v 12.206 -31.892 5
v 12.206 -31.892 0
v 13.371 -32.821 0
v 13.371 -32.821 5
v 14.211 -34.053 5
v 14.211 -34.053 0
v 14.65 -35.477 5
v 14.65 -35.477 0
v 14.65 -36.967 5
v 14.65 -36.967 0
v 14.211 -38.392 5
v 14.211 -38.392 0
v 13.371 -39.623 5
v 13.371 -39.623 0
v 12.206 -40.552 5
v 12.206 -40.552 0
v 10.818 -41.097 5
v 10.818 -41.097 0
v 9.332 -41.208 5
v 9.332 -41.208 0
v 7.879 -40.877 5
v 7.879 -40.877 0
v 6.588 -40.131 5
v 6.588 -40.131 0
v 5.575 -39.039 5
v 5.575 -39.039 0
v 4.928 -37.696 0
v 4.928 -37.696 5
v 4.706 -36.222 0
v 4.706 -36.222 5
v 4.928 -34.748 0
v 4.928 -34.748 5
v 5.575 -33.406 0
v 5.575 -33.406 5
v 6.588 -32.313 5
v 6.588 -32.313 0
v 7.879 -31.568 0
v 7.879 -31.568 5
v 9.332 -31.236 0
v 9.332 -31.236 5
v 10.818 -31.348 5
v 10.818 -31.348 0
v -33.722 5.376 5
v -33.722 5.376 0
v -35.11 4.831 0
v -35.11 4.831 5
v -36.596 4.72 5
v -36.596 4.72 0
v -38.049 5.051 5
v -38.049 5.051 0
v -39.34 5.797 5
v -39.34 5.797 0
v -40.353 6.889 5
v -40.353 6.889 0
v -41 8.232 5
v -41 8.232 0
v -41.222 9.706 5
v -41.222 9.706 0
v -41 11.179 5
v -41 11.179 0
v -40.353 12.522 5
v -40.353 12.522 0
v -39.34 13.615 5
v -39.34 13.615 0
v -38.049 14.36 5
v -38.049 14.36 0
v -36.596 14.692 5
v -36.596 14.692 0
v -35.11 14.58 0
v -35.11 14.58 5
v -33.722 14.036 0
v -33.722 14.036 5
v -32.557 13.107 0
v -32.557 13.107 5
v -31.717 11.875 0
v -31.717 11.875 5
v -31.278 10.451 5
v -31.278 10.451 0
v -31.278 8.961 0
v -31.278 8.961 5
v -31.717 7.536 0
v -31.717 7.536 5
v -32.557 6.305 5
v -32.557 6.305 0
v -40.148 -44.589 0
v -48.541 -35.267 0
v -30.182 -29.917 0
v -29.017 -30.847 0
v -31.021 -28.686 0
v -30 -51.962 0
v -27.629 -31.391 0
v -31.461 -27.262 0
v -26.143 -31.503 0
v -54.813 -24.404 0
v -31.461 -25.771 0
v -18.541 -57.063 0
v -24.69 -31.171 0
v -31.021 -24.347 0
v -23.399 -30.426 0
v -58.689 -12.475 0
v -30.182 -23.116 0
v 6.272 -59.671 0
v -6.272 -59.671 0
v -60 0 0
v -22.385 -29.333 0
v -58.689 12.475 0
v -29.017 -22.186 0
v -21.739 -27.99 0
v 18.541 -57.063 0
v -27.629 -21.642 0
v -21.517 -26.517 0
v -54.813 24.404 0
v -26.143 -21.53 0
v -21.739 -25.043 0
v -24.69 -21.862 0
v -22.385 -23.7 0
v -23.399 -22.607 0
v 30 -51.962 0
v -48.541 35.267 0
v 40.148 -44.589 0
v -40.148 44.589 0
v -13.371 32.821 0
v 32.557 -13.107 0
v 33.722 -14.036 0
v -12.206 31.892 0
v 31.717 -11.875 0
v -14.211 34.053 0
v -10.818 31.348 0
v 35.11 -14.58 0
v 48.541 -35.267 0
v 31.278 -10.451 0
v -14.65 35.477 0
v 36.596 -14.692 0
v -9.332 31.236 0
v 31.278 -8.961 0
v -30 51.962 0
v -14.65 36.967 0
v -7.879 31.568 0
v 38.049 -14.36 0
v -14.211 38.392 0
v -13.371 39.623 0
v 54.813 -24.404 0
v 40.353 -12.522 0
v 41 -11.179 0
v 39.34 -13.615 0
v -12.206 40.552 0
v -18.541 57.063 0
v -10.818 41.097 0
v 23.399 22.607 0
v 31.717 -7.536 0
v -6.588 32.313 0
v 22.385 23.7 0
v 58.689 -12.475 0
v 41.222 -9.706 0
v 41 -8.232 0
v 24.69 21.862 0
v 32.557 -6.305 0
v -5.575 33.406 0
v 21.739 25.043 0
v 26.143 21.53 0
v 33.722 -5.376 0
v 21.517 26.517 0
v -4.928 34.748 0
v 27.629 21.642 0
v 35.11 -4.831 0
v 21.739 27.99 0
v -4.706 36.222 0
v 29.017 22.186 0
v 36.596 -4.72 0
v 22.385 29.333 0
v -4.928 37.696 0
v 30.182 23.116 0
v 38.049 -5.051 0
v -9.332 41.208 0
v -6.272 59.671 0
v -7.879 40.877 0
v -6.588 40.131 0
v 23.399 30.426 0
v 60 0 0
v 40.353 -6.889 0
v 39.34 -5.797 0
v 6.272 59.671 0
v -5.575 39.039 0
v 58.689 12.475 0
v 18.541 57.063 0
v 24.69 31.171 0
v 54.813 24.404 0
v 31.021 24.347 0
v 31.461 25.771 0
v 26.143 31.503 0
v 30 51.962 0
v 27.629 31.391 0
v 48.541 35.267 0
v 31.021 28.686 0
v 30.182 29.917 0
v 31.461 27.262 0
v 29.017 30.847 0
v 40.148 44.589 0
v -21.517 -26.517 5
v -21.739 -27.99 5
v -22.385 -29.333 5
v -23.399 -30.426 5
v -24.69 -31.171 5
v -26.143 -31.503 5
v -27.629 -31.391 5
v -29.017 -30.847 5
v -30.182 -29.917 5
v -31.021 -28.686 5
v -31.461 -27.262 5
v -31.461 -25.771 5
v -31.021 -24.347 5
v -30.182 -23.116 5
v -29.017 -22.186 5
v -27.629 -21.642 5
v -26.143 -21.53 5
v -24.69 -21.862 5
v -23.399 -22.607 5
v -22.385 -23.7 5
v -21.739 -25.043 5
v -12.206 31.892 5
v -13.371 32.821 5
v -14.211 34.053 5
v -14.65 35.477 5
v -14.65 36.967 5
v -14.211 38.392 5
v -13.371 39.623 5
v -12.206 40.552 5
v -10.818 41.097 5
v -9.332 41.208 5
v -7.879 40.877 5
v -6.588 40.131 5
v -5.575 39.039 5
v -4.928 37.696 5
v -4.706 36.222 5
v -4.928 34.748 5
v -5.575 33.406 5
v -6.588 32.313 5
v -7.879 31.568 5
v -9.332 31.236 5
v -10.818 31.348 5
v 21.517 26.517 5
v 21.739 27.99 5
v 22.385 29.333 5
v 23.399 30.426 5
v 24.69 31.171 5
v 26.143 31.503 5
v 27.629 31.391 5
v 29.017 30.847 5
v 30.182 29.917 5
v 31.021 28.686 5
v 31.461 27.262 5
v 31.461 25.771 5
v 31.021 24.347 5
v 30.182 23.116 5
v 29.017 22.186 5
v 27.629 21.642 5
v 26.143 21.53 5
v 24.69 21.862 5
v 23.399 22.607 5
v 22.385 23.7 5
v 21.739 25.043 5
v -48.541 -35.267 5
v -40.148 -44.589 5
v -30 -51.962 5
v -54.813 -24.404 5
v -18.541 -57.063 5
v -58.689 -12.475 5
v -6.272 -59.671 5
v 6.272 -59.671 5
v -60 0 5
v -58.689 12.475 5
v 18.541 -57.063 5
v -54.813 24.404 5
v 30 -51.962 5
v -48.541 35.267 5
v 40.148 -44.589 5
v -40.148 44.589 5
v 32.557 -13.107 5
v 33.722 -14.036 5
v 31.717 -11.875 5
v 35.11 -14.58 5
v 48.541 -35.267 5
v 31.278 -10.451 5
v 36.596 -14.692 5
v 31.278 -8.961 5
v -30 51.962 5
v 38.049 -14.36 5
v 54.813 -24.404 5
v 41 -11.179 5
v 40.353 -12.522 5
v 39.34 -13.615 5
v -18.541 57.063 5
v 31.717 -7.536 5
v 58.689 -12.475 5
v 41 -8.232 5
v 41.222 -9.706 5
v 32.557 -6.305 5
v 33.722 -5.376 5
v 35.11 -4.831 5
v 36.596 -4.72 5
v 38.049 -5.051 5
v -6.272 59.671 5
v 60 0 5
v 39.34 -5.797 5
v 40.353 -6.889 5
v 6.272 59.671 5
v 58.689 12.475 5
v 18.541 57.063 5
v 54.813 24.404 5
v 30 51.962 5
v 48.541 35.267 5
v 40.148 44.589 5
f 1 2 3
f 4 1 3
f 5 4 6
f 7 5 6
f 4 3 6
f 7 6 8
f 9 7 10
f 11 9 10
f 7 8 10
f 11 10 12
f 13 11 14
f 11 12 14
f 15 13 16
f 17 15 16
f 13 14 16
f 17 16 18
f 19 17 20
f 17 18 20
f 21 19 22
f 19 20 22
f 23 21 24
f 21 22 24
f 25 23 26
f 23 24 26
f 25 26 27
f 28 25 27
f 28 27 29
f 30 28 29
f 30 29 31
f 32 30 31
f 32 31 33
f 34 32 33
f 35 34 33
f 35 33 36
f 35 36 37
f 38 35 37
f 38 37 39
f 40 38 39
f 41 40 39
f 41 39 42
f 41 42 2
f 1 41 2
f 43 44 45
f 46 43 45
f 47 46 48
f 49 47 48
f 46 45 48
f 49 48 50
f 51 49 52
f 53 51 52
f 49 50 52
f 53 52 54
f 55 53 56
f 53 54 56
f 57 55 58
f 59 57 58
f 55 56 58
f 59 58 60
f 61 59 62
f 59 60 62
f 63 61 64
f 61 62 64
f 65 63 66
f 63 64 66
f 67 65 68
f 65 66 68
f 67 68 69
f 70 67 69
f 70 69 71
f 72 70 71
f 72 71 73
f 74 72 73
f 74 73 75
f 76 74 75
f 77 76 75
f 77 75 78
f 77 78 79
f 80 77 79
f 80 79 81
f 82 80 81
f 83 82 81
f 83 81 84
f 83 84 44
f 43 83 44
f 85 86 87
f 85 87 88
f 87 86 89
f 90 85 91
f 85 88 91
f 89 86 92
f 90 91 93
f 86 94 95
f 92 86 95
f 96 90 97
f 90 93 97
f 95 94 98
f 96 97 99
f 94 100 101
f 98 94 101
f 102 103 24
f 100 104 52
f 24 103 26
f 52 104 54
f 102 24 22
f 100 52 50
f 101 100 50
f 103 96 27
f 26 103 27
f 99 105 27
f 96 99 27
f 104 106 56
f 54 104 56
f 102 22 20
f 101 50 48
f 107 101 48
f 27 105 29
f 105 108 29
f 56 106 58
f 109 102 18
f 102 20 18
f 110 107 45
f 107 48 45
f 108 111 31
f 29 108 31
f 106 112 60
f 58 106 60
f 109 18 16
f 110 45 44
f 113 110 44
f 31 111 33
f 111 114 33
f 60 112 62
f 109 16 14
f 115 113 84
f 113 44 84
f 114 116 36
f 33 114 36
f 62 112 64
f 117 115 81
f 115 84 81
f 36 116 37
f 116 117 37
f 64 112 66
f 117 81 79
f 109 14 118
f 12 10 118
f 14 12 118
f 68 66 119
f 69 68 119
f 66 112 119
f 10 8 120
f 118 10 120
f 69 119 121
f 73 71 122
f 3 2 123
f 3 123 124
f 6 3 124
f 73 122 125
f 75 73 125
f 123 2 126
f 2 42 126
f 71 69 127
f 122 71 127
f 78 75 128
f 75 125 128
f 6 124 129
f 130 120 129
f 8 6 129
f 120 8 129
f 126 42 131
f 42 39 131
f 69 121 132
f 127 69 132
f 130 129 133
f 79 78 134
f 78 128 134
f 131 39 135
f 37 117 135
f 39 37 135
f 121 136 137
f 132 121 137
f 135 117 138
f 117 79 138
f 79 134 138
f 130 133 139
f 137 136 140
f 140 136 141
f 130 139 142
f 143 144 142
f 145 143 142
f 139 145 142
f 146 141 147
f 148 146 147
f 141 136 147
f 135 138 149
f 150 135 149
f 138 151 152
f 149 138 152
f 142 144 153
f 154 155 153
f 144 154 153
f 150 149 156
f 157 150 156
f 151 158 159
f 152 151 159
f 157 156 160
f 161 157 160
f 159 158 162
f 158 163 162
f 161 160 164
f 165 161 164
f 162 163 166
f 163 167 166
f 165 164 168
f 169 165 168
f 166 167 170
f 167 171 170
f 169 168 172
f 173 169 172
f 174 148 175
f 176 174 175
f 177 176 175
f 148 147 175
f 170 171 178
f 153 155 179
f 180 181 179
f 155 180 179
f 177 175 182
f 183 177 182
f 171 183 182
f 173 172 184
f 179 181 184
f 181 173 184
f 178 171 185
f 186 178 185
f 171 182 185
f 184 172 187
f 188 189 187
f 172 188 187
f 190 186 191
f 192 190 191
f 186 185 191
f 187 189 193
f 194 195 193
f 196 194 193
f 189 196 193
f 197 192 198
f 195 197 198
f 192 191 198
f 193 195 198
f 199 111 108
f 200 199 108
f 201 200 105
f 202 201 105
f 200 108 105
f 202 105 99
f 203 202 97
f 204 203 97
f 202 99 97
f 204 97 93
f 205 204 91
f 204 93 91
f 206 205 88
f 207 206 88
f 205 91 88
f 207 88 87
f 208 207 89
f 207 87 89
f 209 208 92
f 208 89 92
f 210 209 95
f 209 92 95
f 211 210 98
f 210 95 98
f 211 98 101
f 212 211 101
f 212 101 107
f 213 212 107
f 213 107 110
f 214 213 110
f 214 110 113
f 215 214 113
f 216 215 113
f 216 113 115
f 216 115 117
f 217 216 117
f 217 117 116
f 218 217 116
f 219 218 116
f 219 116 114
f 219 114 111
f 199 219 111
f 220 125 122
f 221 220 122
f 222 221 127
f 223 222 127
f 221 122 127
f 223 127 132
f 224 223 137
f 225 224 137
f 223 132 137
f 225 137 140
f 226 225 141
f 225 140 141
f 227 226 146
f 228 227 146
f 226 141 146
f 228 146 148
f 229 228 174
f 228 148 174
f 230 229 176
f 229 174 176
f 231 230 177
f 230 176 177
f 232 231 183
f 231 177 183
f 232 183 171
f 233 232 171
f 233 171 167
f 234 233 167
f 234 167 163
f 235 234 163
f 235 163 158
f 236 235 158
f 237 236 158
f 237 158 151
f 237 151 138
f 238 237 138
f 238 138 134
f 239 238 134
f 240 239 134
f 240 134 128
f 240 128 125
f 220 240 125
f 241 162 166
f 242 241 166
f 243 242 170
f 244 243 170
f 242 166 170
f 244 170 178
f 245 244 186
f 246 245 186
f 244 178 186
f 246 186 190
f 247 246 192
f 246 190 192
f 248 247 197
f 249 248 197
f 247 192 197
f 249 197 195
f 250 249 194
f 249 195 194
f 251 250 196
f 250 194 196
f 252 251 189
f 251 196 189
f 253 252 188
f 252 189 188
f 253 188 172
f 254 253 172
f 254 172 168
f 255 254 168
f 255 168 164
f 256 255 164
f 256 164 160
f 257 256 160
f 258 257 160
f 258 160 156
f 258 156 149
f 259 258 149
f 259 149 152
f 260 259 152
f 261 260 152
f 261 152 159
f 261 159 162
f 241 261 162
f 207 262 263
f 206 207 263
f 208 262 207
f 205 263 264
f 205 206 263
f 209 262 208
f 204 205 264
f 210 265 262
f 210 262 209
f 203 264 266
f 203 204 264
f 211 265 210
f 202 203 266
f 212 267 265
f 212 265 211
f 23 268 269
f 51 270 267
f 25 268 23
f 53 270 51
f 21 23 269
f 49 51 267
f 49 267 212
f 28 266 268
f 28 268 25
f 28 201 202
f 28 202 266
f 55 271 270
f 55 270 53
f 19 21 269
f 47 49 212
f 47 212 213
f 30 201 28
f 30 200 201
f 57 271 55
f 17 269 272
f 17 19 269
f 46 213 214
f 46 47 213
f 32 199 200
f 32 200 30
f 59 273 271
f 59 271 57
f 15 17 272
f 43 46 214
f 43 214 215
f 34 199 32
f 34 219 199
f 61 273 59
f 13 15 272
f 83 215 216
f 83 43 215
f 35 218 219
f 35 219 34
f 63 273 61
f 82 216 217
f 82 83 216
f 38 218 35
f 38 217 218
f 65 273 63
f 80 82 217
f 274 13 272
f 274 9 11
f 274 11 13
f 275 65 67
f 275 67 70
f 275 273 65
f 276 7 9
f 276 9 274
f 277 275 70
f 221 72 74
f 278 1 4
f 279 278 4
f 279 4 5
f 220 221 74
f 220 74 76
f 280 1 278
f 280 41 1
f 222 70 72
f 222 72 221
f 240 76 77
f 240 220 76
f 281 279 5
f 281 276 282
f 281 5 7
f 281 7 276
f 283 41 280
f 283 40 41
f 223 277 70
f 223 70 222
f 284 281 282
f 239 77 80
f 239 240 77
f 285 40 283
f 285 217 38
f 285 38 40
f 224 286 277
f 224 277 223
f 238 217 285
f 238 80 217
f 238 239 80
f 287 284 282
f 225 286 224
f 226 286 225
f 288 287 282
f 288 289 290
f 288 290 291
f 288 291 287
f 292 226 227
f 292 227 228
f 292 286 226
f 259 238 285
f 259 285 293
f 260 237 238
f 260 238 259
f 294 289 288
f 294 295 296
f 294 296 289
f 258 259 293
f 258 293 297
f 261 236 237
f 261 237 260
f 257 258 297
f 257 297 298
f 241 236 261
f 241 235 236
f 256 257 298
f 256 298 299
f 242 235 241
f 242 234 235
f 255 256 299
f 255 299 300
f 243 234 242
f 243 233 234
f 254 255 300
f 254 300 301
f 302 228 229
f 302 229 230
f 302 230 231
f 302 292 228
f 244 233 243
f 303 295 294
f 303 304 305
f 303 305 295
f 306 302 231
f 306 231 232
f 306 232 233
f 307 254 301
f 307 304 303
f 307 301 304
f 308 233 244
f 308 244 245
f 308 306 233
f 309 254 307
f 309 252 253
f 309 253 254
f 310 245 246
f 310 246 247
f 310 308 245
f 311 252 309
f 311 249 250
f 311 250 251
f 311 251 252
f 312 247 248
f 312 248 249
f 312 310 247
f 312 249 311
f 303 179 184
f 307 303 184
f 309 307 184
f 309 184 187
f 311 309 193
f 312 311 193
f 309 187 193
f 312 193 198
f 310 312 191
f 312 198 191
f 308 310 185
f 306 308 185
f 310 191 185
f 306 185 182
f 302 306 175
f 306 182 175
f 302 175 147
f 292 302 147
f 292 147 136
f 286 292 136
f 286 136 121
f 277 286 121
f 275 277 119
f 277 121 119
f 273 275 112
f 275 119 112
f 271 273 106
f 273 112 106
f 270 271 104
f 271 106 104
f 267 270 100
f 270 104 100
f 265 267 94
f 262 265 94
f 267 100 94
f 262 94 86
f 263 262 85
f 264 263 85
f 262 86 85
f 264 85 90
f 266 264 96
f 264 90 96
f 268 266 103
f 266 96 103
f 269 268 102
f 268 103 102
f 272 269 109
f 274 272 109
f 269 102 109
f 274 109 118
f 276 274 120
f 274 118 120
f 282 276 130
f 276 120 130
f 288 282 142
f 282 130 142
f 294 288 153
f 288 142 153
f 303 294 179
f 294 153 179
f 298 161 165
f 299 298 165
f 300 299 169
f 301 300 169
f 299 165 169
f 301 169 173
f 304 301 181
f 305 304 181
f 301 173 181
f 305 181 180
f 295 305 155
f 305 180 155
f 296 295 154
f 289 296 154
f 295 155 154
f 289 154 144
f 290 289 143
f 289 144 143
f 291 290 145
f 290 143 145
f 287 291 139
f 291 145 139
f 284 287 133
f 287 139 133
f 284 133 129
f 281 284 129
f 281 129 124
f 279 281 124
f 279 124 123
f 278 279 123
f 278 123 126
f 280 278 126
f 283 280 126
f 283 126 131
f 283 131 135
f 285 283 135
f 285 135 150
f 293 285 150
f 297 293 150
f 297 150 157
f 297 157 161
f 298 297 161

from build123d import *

# Parameters (mm, degrees)
F0_R            = 60
F1_DEPTH        = 5
F3_D            = 10
F3_COPIES_COUNT = 6


# Not quite as in the source:
# - a pattern or mirror of a feature is missing from the dataset's text; its kind, count and spacing are read off the source's solid


with BuildPart() as f1:
    # F0 (on Top) → F1 (new body)
    with BuildSketch(Plane.XY):
        Circle(F0_R)
    extrude(amount=F1_DEPTH)

    # F3 (through all)
    with Locations(Plane.XY.offset(5)):
        with Locations((26.5165042945, 26.5165042945)):
            f3 = Hole(F3_D / 2)

    # F3_copies: F3 ×6 about axis
    f3_copies_axis = Axis((0, 0, 0), (0, 0, 1))
    for i in range(1, F3_COPIES_COUNT):
        add(f3.rotate(f3_copies_axis, i * 360 / F3_COPIES_COUNT), mode=Mode.SUBTRACT)


solid = f1.part
